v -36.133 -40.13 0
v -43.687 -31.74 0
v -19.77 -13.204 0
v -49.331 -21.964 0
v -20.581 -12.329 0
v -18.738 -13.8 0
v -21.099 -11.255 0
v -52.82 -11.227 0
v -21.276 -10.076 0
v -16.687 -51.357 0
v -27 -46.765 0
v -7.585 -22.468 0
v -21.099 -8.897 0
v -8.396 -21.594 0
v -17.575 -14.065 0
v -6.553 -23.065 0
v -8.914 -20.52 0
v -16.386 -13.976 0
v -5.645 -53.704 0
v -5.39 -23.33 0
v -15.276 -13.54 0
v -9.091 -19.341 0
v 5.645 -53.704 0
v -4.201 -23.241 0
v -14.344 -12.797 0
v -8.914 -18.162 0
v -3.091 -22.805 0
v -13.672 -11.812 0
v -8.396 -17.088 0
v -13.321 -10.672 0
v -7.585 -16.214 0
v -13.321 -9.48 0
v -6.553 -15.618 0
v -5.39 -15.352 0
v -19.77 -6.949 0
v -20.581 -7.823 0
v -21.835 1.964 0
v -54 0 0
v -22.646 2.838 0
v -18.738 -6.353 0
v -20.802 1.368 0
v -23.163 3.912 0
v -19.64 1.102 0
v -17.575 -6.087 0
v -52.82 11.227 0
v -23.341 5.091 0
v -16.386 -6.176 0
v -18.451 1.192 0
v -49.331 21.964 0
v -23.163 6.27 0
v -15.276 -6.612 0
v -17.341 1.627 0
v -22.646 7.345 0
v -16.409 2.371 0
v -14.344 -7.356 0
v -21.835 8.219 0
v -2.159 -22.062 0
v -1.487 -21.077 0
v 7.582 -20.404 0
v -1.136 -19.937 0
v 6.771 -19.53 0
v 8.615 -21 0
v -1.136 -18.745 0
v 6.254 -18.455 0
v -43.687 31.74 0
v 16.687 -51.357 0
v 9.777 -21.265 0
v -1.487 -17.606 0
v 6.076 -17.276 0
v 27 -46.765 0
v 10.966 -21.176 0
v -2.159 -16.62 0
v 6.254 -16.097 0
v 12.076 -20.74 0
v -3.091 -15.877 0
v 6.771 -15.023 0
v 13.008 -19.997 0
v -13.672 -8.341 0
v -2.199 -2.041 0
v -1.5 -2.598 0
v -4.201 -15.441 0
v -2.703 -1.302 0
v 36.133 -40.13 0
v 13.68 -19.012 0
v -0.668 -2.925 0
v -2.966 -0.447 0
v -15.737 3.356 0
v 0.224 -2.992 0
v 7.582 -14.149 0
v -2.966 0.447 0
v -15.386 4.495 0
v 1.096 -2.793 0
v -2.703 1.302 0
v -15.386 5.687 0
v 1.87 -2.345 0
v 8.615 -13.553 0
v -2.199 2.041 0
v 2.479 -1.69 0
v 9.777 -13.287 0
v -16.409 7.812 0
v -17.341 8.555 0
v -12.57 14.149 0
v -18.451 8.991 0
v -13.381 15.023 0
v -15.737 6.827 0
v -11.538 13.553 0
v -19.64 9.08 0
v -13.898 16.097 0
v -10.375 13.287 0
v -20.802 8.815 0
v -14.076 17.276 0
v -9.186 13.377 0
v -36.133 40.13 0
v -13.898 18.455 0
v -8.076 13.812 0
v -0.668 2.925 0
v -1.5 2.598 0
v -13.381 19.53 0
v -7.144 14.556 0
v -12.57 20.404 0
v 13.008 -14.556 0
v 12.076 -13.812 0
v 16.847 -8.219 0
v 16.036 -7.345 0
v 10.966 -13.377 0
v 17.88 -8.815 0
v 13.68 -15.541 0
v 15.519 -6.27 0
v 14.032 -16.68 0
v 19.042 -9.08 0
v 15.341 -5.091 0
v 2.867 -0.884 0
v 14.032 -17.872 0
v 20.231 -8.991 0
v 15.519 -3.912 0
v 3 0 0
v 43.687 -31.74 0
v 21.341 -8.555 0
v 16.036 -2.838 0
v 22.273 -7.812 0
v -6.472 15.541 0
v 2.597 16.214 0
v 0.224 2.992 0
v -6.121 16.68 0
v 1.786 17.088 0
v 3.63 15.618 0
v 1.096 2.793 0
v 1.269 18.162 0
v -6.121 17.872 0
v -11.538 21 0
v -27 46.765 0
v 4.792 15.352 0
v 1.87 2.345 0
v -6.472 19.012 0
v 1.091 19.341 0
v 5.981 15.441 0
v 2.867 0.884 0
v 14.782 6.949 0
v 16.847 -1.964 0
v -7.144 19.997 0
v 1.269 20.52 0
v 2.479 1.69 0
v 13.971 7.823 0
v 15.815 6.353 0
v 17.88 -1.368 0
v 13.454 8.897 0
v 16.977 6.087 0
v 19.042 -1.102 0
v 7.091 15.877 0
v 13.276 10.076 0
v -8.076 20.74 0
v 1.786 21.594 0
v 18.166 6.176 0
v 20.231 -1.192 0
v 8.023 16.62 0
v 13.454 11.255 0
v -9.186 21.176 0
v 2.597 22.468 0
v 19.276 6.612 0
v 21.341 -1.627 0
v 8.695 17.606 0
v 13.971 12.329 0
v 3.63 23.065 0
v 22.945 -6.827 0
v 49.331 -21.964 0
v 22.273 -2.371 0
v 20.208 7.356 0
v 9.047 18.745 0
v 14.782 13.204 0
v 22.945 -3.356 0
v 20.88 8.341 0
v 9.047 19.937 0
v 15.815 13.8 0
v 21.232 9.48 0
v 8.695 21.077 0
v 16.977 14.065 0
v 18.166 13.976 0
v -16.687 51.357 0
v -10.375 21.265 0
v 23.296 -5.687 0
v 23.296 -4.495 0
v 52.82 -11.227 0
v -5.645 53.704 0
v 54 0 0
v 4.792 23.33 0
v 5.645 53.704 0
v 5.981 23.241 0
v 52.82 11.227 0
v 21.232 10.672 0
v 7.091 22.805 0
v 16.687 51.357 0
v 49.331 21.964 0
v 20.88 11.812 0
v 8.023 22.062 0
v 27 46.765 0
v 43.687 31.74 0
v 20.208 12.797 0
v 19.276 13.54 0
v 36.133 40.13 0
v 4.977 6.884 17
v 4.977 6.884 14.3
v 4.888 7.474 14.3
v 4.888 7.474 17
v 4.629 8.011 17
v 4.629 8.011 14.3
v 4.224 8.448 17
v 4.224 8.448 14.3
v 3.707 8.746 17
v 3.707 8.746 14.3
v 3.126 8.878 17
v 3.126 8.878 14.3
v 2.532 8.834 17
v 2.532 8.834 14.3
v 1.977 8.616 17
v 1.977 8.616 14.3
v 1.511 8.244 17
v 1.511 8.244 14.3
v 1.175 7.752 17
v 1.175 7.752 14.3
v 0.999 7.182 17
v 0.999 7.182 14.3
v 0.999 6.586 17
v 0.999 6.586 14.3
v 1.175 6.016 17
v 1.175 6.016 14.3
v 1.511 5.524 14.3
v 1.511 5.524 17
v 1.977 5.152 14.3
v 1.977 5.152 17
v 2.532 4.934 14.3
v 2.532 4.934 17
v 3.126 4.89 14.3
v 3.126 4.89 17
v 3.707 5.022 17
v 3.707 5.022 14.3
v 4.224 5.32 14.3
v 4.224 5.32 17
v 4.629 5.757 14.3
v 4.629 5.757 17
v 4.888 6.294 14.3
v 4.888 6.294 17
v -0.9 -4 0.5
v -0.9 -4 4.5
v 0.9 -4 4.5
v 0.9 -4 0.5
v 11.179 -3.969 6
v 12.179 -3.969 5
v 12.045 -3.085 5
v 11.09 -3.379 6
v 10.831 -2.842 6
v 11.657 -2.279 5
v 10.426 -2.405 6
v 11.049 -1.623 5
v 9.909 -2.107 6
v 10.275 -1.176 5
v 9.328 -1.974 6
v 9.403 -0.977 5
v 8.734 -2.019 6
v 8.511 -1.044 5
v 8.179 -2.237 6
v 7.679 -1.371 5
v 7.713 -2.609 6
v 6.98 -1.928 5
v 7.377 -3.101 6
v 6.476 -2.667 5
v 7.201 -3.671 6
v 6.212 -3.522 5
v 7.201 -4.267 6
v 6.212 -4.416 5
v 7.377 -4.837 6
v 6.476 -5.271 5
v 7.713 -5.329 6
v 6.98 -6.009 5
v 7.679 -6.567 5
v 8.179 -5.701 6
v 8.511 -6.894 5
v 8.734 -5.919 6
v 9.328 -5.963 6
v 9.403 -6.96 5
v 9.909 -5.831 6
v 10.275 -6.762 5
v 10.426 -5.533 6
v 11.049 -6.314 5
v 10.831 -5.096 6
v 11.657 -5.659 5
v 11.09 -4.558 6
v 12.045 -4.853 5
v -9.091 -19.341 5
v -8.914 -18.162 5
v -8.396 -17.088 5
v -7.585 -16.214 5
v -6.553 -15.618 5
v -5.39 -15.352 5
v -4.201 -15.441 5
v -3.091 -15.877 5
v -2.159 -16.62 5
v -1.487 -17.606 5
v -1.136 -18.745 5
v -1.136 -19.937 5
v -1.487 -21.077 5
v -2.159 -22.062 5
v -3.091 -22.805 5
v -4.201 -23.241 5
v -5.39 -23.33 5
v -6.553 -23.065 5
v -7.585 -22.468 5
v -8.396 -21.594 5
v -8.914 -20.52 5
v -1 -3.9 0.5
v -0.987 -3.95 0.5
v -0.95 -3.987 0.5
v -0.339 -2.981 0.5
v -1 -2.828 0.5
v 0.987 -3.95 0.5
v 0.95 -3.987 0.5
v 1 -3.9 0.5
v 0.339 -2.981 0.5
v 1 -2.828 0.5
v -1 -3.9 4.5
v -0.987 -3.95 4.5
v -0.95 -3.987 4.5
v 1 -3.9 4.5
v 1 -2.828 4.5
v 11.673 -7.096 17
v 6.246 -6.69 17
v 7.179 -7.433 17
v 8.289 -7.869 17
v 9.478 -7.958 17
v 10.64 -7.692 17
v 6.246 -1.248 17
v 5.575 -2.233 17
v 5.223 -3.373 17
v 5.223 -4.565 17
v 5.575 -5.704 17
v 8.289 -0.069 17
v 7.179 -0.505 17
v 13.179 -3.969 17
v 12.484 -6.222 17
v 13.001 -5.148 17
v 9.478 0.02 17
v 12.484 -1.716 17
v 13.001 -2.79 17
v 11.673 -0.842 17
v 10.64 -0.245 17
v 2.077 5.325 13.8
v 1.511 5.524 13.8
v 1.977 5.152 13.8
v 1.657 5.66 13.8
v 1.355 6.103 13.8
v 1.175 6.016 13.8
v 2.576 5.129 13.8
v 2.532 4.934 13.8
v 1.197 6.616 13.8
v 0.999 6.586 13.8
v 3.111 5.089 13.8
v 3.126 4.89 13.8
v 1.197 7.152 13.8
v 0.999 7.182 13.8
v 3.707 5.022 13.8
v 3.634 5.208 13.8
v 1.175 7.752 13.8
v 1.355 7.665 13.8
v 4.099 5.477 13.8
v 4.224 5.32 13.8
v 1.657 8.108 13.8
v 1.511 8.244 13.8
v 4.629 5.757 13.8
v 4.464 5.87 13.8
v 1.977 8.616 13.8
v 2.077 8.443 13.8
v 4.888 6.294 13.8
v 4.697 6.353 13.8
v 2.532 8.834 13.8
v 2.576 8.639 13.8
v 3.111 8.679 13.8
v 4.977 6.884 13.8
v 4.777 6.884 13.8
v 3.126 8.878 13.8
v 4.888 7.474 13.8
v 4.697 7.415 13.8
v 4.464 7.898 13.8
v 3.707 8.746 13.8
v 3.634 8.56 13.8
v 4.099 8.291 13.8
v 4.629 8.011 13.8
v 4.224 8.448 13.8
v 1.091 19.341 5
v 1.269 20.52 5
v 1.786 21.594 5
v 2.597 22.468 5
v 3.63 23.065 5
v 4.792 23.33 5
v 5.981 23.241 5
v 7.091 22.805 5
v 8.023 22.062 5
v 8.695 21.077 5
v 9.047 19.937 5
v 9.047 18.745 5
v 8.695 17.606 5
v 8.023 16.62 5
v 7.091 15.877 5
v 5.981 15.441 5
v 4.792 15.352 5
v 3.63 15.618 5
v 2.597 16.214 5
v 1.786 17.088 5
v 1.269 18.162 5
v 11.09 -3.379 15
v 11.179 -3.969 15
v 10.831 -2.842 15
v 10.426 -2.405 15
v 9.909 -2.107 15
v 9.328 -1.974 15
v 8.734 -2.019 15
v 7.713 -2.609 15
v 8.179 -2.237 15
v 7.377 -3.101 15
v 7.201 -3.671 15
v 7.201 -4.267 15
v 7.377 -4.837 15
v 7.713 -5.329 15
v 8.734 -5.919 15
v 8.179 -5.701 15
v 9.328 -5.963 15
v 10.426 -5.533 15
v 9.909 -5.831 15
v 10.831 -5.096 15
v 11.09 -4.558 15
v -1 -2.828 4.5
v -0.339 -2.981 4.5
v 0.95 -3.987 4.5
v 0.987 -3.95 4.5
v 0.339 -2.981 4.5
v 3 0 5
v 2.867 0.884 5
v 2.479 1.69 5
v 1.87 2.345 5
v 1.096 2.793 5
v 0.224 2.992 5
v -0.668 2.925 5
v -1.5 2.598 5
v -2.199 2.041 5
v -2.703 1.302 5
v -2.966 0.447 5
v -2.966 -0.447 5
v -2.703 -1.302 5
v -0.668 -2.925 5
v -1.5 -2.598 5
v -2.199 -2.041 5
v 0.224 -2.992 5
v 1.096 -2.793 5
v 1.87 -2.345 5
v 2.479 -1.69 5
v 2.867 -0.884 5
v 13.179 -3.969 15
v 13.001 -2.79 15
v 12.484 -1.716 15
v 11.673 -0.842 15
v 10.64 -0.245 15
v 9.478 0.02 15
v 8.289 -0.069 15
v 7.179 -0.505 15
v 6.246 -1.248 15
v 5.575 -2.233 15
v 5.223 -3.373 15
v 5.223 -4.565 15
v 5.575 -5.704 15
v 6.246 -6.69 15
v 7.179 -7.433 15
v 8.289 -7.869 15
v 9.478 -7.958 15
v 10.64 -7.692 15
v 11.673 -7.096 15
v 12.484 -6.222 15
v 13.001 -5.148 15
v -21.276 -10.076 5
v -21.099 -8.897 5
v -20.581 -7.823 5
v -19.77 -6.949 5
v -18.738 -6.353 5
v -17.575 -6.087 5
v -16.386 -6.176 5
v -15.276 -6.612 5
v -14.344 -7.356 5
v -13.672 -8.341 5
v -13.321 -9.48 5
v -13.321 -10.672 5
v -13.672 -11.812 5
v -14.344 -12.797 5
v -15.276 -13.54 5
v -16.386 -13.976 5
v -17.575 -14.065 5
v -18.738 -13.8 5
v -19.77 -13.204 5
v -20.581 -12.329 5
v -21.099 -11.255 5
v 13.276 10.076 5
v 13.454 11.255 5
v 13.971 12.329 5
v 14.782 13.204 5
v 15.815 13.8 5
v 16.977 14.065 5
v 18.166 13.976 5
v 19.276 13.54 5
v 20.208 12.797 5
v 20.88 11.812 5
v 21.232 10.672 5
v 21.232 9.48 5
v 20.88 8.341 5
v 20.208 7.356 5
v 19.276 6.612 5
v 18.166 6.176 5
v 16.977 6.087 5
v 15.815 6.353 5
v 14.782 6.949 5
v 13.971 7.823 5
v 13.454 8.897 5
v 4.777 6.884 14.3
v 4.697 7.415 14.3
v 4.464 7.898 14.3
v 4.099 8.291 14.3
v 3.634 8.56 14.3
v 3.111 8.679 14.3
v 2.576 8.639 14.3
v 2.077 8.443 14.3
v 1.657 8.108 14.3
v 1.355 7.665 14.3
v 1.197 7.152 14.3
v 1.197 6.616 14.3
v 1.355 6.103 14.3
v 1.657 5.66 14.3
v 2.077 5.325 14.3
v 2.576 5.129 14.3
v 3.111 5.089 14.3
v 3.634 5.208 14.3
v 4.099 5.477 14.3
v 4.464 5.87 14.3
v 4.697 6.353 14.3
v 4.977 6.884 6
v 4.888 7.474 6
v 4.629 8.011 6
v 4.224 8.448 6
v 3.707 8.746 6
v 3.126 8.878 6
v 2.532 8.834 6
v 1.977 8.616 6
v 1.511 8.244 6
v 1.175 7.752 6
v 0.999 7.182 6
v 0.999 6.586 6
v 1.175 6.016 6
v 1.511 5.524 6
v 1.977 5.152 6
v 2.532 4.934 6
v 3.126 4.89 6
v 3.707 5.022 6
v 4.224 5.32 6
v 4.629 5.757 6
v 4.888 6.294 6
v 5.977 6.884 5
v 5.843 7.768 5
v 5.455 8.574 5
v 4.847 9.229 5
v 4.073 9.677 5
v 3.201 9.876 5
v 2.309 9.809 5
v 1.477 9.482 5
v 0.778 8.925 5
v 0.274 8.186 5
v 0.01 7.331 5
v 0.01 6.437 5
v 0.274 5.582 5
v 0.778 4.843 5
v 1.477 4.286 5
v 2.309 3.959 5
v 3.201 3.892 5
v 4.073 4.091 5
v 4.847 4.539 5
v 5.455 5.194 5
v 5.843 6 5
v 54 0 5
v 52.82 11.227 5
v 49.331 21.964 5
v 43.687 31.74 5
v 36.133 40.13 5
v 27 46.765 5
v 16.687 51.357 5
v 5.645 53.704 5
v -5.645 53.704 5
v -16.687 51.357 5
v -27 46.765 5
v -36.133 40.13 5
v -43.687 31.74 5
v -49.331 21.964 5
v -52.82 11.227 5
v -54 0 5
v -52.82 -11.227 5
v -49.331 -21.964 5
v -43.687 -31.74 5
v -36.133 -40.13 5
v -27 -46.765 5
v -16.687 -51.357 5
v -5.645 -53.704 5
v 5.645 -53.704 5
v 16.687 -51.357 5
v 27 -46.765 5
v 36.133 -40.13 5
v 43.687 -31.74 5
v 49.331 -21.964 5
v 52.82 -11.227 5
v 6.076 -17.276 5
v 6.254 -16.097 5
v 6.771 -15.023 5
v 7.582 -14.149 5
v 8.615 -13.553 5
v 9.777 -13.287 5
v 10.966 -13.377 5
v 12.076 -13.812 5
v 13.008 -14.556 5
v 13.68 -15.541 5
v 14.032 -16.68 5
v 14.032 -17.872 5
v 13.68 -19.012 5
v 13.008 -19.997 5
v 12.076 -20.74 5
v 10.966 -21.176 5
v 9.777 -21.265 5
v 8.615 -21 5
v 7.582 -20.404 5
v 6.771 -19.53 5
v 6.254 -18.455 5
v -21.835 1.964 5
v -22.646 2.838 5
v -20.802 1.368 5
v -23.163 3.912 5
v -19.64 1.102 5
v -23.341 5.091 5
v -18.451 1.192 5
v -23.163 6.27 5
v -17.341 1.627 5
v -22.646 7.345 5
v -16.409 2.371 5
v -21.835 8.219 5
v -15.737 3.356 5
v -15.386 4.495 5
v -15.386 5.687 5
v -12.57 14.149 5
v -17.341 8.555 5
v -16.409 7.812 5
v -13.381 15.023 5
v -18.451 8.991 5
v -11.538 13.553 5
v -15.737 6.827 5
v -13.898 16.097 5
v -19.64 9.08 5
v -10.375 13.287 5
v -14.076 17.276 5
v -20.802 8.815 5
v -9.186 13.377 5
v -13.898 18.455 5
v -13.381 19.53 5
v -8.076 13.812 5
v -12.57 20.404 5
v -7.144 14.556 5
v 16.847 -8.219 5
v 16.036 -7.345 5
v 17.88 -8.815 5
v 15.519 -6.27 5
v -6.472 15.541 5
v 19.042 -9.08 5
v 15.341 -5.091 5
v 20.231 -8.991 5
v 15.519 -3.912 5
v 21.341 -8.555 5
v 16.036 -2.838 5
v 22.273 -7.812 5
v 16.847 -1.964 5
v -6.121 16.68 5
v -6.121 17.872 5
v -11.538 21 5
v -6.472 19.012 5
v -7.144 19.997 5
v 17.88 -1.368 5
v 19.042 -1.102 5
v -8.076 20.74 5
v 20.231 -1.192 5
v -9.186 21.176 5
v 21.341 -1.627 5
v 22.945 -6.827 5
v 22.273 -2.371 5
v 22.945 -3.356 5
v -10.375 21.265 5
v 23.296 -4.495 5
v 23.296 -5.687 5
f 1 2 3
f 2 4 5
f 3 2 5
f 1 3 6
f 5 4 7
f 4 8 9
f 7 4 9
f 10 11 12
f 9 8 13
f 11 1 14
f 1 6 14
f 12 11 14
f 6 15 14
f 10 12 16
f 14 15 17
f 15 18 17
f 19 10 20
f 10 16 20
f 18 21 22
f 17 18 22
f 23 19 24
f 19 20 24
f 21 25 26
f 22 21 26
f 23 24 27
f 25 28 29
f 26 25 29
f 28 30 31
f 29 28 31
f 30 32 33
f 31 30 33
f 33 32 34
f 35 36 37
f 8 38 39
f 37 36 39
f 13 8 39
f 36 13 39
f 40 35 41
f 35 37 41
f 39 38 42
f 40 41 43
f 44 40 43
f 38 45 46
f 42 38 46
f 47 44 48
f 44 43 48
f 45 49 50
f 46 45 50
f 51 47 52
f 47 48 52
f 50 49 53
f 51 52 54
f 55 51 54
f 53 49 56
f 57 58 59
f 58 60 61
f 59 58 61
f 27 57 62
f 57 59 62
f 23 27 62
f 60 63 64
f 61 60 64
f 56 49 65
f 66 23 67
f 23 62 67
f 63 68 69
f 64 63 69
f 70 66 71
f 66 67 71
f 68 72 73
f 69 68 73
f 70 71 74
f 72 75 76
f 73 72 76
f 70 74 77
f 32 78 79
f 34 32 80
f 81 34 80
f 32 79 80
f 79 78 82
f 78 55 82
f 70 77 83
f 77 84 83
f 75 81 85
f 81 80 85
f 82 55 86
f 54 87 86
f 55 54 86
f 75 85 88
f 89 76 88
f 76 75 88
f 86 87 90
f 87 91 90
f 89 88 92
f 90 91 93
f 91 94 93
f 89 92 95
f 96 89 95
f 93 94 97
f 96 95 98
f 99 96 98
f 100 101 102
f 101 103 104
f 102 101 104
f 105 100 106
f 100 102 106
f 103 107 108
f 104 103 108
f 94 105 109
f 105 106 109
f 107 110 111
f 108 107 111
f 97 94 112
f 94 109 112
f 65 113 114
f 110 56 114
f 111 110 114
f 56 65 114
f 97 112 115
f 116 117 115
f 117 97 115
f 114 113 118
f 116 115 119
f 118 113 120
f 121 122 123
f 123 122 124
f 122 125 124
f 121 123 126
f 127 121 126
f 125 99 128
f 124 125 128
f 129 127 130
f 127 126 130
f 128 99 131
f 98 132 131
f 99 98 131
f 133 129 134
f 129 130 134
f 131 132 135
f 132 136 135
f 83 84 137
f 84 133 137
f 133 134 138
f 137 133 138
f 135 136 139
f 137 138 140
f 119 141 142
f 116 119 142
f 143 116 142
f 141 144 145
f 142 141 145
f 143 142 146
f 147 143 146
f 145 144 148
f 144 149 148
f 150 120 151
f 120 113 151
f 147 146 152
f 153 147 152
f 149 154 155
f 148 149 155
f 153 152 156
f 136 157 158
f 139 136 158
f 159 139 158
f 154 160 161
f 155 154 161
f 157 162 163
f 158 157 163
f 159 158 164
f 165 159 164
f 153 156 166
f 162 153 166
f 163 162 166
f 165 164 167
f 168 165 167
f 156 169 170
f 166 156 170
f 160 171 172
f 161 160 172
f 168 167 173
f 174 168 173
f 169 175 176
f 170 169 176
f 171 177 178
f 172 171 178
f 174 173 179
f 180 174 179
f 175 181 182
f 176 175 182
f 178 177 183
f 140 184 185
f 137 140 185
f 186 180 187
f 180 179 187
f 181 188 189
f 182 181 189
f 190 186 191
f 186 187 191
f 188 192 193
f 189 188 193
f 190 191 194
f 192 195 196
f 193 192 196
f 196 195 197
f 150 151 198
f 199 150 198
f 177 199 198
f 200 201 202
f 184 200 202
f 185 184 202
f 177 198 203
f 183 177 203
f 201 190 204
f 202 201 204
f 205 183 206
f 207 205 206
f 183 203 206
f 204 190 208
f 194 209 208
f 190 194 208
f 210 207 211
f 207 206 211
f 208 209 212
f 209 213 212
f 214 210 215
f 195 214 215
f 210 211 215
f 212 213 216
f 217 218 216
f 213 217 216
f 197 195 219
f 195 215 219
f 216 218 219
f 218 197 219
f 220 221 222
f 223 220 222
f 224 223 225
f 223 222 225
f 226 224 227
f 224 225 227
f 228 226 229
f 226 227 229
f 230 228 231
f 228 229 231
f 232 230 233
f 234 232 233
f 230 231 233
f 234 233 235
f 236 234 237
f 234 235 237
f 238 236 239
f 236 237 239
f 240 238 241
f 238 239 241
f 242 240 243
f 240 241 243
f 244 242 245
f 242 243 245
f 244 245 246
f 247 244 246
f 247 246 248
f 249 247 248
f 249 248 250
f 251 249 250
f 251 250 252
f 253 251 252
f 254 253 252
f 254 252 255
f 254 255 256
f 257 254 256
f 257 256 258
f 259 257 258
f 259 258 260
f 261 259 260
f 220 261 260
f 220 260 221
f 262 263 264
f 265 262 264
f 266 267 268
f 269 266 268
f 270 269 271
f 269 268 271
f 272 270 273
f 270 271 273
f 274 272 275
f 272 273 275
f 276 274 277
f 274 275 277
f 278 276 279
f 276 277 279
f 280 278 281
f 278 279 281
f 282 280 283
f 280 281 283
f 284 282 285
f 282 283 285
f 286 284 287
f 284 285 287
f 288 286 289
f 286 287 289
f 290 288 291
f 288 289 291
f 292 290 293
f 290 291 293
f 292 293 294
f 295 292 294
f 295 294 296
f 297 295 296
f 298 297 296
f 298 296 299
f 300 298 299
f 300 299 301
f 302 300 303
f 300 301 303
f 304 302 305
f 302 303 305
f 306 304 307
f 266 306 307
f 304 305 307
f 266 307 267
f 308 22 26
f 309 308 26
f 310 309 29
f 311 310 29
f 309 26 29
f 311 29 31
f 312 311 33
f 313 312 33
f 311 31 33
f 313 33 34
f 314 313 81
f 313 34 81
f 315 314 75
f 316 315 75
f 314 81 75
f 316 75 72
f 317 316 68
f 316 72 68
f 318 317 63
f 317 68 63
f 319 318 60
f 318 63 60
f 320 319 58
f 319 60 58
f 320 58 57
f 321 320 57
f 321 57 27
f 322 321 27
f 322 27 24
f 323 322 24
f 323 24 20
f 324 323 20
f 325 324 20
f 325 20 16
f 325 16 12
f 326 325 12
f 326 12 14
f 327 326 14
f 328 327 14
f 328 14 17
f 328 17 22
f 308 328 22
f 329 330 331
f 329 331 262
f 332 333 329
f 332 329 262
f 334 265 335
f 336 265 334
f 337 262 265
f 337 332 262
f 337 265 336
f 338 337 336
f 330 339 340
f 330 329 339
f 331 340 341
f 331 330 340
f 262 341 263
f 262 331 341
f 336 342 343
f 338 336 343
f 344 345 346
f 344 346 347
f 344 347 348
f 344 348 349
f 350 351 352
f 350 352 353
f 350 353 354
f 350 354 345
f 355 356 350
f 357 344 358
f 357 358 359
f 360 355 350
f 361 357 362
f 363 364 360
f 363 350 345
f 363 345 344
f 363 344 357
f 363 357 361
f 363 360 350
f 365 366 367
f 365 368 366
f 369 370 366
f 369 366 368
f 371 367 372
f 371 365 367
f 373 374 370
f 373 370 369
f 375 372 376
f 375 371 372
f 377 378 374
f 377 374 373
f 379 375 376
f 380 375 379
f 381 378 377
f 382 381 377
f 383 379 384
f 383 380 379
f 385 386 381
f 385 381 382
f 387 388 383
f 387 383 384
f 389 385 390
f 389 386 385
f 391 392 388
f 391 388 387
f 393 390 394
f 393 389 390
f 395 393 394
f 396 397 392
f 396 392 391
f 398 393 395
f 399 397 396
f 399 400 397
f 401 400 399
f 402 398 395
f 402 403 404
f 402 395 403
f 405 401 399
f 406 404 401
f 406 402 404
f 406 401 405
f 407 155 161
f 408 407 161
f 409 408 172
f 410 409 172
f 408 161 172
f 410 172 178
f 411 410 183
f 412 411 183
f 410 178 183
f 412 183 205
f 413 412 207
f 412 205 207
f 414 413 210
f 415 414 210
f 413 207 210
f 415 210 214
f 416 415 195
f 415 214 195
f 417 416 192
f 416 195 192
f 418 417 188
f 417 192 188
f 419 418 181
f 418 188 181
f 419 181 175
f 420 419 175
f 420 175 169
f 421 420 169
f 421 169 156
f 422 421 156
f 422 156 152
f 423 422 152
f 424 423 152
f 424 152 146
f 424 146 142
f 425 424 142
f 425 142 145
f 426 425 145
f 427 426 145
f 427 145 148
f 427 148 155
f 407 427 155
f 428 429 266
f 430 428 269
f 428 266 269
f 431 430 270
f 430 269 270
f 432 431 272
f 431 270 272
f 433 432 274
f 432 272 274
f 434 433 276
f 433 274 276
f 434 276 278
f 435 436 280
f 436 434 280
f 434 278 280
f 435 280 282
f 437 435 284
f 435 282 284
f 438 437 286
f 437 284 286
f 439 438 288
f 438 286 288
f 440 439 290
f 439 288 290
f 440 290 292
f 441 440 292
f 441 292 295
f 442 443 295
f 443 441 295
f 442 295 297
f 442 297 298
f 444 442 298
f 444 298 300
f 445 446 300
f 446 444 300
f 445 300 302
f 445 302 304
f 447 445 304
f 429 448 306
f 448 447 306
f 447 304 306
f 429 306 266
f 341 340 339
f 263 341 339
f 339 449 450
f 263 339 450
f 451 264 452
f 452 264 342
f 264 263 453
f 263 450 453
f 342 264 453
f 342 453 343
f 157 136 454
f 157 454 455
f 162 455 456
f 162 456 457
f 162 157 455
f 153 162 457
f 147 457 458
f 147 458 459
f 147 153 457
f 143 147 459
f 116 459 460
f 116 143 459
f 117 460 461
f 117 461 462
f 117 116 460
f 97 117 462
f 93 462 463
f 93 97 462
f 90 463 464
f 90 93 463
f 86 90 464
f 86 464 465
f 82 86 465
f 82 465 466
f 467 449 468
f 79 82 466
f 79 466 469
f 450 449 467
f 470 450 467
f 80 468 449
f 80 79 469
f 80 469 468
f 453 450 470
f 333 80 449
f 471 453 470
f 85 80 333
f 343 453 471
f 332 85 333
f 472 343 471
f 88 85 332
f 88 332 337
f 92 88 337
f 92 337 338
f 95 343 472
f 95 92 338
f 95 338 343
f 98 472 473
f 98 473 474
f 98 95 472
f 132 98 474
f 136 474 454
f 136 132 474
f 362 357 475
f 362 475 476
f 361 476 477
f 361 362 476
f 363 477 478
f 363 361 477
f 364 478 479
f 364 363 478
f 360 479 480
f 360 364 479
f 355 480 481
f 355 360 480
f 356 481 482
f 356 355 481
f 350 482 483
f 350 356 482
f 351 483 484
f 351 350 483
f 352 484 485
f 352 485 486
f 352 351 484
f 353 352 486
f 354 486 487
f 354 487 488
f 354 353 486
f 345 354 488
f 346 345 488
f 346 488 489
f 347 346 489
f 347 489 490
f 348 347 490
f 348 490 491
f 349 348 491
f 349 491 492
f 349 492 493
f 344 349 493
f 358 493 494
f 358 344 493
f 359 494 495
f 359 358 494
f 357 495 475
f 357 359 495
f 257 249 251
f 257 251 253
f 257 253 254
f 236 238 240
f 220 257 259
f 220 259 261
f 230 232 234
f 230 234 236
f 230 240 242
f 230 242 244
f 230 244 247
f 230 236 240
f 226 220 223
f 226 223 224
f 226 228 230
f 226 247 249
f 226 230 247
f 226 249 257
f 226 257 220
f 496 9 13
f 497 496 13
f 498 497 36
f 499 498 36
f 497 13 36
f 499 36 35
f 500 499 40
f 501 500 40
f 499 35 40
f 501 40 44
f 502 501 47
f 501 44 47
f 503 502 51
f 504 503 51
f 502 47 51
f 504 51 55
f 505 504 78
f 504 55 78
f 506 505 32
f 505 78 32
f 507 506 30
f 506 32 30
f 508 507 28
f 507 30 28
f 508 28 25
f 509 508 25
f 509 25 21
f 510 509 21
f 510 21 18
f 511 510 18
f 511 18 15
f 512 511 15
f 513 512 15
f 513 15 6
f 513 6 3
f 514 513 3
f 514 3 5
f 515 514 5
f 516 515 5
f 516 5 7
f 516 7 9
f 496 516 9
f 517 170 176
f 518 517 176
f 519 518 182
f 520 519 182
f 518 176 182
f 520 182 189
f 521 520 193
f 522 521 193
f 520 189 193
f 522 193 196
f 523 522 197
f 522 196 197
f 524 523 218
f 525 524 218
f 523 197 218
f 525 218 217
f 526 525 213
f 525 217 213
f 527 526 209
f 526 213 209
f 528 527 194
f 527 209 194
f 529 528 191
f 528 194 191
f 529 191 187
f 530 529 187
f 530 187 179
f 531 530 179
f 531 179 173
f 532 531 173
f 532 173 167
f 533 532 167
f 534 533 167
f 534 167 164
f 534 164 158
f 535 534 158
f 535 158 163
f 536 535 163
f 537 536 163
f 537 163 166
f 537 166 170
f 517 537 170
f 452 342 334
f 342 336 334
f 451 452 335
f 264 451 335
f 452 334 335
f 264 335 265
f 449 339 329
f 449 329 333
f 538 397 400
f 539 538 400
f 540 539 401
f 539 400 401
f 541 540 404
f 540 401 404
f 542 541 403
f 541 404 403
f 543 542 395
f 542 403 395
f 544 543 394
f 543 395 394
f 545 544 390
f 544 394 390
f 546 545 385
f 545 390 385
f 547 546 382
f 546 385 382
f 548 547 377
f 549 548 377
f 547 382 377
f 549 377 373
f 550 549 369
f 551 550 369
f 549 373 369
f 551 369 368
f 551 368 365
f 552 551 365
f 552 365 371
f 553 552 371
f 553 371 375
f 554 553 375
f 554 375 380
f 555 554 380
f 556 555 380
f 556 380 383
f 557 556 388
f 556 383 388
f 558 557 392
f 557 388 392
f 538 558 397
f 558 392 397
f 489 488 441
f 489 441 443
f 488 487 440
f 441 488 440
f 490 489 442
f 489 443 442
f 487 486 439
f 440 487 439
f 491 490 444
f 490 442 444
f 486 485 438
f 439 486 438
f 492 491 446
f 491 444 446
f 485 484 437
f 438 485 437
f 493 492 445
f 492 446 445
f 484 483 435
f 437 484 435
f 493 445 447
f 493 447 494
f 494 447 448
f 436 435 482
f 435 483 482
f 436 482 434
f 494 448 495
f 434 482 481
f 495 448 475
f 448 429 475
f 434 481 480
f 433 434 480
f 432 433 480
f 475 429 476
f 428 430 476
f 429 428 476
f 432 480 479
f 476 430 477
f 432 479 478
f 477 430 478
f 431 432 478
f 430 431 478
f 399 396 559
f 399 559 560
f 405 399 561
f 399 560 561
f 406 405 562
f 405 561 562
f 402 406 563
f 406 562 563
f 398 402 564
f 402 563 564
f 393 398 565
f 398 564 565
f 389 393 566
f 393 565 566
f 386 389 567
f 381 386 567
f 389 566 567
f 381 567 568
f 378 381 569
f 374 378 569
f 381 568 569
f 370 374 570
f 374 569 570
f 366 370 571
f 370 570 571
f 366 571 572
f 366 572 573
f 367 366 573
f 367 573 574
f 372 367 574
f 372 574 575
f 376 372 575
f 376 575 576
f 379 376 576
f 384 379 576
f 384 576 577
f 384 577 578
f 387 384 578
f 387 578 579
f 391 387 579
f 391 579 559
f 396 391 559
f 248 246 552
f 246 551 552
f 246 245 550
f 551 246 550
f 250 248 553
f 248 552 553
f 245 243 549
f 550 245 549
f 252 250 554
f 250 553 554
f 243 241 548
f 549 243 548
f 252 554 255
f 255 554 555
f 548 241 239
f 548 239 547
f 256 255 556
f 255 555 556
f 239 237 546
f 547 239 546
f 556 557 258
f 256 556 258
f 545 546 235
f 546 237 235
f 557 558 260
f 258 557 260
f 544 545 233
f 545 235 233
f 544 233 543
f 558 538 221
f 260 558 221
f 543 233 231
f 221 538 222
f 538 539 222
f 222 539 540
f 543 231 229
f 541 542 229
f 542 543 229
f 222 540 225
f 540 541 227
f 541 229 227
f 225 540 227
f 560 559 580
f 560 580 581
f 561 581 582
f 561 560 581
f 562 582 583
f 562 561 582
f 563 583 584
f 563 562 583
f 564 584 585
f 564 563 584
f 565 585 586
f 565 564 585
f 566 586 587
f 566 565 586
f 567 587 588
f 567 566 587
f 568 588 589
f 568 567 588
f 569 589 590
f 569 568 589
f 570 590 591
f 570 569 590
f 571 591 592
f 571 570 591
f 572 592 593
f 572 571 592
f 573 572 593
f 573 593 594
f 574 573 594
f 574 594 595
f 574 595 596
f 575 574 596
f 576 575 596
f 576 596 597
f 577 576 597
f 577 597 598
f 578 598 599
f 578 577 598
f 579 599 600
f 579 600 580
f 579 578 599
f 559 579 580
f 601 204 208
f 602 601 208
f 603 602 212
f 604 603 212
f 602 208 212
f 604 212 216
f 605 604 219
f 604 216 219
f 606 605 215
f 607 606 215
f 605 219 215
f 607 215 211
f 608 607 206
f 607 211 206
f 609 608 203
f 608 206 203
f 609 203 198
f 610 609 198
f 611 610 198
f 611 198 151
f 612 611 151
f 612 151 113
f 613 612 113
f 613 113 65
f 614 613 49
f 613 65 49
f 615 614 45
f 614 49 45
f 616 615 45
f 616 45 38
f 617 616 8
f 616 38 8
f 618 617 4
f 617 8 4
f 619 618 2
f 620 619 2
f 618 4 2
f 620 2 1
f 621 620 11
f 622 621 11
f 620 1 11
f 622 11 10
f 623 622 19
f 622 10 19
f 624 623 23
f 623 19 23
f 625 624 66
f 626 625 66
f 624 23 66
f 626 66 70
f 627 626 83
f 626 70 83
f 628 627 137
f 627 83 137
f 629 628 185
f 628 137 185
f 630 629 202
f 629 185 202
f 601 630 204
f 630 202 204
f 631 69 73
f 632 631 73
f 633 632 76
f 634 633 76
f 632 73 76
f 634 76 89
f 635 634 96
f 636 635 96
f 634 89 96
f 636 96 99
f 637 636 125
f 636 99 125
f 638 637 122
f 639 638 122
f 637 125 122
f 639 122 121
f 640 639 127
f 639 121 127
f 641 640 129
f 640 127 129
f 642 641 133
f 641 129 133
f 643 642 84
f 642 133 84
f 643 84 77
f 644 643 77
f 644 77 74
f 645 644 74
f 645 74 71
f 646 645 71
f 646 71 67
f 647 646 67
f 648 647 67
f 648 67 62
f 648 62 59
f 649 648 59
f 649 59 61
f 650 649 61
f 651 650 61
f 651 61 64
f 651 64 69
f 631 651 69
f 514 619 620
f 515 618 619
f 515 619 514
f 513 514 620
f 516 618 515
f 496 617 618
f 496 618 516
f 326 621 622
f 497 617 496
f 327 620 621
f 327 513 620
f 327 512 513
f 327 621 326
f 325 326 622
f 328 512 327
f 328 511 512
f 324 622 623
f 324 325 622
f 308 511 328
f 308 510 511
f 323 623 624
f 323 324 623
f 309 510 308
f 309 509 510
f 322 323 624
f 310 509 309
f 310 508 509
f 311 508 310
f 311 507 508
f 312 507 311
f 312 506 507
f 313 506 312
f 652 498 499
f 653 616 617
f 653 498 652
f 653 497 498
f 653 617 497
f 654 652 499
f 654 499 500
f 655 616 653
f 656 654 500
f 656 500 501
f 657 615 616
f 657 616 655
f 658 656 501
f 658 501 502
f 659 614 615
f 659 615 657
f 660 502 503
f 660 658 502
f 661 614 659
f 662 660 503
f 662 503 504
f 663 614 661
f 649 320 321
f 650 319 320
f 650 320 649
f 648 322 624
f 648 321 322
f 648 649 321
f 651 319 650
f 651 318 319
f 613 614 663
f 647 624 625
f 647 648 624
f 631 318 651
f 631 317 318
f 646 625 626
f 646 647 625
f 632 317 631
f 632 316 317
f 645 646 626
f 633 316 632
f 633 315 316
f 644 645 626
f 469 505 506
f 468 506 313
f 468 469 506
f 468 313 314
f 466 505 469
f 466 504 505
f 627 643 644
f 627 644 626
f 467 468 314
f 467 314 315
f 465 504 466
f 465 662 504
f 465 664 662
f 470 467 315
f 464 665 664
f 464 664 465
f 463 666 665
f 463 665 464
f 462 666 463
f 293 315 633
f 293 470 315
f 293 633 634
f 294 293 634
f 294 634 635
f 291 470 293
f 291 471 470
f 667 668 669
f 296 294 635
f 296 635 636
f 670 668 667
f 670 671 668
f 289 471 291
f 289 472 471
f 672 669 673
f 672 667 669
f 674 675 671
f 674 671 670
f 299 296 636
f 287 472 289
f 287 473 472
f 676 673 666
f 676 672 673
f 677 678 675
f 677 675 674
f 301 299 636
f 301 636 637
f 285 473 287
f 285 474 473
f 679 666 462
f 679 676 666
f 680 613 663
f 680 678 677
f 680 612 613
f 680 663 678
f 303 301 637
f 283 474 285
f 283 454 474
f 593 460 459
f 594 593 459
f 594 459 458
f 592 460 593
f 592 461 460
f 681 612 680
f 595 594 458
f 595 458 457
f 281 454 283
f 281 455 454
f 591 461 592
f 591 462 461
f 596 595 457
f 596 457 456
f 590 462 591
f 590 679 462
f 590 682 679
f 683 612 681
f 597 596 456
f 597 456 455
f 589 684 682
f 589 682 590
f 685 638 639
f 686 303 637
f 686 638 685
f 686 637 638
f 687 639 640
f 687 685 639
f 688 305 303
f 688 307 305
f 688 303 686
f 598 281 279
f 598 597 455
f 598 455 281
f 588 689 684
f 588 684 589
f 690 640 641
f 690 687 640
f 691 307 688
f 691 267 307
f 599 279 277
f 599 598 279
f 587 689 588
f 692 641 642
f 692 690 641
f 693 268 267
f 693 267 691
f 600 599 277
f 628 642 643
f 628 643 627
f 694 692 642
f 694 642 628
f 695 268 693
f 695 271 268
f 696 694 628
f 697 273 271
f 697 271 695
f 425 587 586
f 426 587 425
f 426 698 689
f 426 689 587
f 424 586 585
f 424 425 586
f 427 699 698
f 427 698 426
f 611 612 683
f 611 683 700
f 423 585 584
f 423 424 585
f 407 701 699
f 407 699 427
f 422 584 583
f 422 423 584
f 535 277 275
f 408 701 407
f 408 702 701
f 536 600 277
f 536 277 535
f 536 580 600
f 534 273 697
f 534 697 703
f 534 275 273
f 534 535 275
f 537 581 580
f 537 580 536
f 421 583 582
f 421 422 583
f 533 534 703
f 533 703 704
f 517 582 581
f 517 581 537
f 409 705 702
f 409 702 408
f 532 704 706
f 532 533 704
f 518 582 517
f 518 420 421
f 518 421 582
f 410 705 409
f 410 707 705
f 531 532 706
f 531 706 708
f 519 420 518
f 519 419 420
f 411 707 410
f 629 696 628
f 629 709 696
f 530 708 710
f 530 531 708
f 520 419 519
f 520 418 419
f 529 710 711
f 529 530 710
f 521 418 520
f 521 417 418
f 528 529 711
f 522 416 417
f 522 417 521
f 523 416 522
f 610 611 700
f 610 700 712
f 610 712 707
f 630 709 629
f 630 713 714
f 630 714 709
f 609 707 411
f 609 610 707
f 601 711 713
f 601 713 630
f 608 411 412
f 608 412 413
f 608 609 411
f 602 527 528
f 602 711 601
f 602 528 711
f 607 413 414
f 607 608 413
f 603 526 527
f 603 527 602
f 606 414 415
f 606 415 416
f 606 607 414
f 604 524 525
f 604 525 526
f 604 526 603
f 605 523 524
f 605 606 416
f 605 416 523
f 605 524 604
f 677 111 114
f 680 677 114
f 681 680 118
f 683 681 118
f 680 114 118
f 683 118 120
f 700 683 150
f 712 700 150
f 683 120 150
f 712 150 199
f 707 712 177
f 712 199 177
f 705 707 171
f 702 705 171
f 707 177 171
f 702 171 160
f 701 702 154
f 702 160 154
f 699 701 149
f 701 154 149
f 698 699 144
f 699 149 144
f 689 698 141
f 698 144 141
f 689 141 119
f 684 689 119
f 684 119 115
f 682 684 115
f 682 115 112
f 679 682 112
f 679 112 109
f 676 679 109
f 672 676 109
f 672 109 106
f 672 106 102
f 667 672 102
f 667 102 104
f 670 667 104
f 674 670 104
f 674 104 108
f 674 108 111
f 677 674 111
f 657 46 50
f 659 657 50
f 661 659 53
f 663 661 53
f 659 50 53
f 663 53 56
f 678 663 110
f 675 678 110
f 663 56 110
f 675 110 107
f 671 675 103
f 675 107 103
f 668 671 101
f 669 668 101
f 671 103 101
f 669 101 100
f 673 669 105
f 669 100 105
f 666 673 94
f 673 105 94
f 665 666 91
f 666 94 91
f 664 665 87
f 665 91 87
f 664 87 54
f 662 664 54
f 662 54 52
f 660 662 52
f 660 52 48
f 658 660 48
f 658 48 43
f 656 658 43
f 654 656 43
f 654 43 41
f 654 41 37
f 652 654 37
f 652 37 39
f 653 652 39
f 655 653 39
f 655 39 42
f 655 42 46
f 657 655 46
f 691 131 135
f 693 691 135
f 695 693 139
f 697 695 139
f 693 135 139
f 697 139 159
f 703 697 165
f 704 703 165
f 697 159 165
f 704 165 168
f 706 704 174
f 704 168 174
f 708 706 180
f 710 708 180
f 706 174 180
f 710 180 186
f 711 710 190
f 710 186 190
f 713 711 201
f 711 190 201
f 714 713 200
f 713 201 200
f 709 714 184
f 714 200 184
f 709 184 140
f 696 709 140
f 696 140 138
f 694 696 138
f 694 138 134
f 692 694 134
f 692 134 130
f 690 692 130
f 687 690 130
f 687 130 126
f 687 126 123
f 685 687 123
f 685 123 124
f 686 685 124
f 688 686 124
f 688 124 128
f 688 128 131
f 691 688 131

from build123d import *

# Parameters (mm, degrees)
SKETCH_1_R          = 54
SKETCH_1_R_2        = 3
EXTRUDE_1_DEPTH     = 5
SKETCH_3_R          = 4
CUT_EXTRUDE_2_DEPTH = 77.531039455
SKETCH_4_R          = 2
EXTRUDE_2_DEPTH     = 12
CUT_EXTRUDE_START   = -3.2
SKETCH_6_R          = 2
SKETCH_6_R_2        = 1.8
CUT_EXTRUDE_3_DEPTH = 0.5
SKETCH_7_R          = 4
EXTRUDE_3_DEPTH     = 2
CHAMFER_1_SIZE      = 1
CUT_EXTRUDE_START_2 = -0.5
SKETCH_9_W          = 2
SKETCH_9_H          = 2
CUT_EXTRUDE_5_DEPTH = 4
FILLET_1_R          = 0.1


with BuildPart() as part:
    # Sketch 1 → Extrude 1 (new body)
    with BuildSketch(Plane.XY):
        Circle(SKETCH_1_R)
        Circle(SKETCH_1_R_2, mode=Mode.SUBTRACT)
    extrude(amount=EXTRUDE_1_DEPTH)

    # Sketch 3 → Cut-Extrude 2 (cut, through all)
    with BuildSketch(Plane(origin=(0, 0, 0), x_dir=(-1, 0, 0), z_dir=(0, 0, -1))):
        with Locations((-5.091227954, 19.341132281)):
            Circle(SKETCH_3_R)
        with Locations((10.076203981, 17.276287603)):
            Circle(SKETCH_3_R)
        with Locations((19.341132281, 5.091227954)):
            Circle(SKETCH_3_R)
        with Locations((17.276287603, -10.076203981)):
            Circle(SKETCH_3_R)
        with Locations((5.091227954, -19.341132281)):
            Circle(SKETCH_3_R)
        with Locations((-10.076203981, -17.276287603)):
            Circle(SKETCH_3_R)
        with Locations((-19.341132281, -5.091227954)):
            Circle(SKETCH_3_R)
        with Locations((-17.276287603, 10.076203981)):
            Circle(SKETCH_3_R)
    extrude(amount=-CUT_EXTRUDE_2_DEPTH, mode=Mode.SUBTRACT)

    # Sketch 4 → Extrude 2 (add)
    with BuildSketch(Plane.XY.offset(5)):
        with Locations((2.976659474, 6.884003078)):
            Circle(SKETCH_4_R)
        with Locations((9.178670771, -3.968879298)):
            Circle(SKETCH_4_R)
    extrude(amount=EXTRUDE_2_DEPTH)

    # Sketch 6 → Cut-Extrude 3 (cut)
    with BuildSketch(Plane.XY.offset(17).offset(CUT_EXTRUDE_START)):
        with Locations((2.976659474, 6.884003078)):
            Circle(SKETCH_6_R)
        with Locations((2.976659474, 6.884003078)):
            Circle(SKETCH_6_R_2, mode=Mode.SUBTRACT)
    extrude(amount=CUT_EXTRUDE_3_DEPTH, mode=Mode.SUBTRACT)

    # Sketch 7 → Extrude 3 (add)
    with BuildSketch(Plane.XY.offset(17)):
        with Locations((9.178670771, -3.968879298)):
            Circle(SKETCH_7_R)
    extrude(amount=-EXTRUDE_3_DEPTH)

    # Chamfer 1
    chamfer_1_edges = [part.edges().sort_by_distance(p)[0] for p in [
        (0.976659474, 6.884003078, 5),
        (7.178670771, -3.968879298, 5),
    ]]
    chamfer(chamfer_1_edges, length=CHAMFER_1_SIZE)

    # Sketch 9 → Cut-Extrude 5 (cut)
    with BuildSketch(Plane.XY.offset(5).offset(CUT_EXTRUDE_START_2)):
        with Locations((0, -3)):
            Rectangle(SKETCH_9_W, SKETCH_9_H)
    extrude(amount=-CUT_EXTRUDE_5_DEPTH, mode=Mode.SUBTRACT)

    # Fillet 1
    fillet_1_edges = [part.edges().sort_by_distance(p)[0] for p in [
        (1, -4, 2.5),
        (-1, -4, 2.5),
    ]]
    fillet(fillet_1_edges, radius=FILLET_1_R)


solid = part.part
